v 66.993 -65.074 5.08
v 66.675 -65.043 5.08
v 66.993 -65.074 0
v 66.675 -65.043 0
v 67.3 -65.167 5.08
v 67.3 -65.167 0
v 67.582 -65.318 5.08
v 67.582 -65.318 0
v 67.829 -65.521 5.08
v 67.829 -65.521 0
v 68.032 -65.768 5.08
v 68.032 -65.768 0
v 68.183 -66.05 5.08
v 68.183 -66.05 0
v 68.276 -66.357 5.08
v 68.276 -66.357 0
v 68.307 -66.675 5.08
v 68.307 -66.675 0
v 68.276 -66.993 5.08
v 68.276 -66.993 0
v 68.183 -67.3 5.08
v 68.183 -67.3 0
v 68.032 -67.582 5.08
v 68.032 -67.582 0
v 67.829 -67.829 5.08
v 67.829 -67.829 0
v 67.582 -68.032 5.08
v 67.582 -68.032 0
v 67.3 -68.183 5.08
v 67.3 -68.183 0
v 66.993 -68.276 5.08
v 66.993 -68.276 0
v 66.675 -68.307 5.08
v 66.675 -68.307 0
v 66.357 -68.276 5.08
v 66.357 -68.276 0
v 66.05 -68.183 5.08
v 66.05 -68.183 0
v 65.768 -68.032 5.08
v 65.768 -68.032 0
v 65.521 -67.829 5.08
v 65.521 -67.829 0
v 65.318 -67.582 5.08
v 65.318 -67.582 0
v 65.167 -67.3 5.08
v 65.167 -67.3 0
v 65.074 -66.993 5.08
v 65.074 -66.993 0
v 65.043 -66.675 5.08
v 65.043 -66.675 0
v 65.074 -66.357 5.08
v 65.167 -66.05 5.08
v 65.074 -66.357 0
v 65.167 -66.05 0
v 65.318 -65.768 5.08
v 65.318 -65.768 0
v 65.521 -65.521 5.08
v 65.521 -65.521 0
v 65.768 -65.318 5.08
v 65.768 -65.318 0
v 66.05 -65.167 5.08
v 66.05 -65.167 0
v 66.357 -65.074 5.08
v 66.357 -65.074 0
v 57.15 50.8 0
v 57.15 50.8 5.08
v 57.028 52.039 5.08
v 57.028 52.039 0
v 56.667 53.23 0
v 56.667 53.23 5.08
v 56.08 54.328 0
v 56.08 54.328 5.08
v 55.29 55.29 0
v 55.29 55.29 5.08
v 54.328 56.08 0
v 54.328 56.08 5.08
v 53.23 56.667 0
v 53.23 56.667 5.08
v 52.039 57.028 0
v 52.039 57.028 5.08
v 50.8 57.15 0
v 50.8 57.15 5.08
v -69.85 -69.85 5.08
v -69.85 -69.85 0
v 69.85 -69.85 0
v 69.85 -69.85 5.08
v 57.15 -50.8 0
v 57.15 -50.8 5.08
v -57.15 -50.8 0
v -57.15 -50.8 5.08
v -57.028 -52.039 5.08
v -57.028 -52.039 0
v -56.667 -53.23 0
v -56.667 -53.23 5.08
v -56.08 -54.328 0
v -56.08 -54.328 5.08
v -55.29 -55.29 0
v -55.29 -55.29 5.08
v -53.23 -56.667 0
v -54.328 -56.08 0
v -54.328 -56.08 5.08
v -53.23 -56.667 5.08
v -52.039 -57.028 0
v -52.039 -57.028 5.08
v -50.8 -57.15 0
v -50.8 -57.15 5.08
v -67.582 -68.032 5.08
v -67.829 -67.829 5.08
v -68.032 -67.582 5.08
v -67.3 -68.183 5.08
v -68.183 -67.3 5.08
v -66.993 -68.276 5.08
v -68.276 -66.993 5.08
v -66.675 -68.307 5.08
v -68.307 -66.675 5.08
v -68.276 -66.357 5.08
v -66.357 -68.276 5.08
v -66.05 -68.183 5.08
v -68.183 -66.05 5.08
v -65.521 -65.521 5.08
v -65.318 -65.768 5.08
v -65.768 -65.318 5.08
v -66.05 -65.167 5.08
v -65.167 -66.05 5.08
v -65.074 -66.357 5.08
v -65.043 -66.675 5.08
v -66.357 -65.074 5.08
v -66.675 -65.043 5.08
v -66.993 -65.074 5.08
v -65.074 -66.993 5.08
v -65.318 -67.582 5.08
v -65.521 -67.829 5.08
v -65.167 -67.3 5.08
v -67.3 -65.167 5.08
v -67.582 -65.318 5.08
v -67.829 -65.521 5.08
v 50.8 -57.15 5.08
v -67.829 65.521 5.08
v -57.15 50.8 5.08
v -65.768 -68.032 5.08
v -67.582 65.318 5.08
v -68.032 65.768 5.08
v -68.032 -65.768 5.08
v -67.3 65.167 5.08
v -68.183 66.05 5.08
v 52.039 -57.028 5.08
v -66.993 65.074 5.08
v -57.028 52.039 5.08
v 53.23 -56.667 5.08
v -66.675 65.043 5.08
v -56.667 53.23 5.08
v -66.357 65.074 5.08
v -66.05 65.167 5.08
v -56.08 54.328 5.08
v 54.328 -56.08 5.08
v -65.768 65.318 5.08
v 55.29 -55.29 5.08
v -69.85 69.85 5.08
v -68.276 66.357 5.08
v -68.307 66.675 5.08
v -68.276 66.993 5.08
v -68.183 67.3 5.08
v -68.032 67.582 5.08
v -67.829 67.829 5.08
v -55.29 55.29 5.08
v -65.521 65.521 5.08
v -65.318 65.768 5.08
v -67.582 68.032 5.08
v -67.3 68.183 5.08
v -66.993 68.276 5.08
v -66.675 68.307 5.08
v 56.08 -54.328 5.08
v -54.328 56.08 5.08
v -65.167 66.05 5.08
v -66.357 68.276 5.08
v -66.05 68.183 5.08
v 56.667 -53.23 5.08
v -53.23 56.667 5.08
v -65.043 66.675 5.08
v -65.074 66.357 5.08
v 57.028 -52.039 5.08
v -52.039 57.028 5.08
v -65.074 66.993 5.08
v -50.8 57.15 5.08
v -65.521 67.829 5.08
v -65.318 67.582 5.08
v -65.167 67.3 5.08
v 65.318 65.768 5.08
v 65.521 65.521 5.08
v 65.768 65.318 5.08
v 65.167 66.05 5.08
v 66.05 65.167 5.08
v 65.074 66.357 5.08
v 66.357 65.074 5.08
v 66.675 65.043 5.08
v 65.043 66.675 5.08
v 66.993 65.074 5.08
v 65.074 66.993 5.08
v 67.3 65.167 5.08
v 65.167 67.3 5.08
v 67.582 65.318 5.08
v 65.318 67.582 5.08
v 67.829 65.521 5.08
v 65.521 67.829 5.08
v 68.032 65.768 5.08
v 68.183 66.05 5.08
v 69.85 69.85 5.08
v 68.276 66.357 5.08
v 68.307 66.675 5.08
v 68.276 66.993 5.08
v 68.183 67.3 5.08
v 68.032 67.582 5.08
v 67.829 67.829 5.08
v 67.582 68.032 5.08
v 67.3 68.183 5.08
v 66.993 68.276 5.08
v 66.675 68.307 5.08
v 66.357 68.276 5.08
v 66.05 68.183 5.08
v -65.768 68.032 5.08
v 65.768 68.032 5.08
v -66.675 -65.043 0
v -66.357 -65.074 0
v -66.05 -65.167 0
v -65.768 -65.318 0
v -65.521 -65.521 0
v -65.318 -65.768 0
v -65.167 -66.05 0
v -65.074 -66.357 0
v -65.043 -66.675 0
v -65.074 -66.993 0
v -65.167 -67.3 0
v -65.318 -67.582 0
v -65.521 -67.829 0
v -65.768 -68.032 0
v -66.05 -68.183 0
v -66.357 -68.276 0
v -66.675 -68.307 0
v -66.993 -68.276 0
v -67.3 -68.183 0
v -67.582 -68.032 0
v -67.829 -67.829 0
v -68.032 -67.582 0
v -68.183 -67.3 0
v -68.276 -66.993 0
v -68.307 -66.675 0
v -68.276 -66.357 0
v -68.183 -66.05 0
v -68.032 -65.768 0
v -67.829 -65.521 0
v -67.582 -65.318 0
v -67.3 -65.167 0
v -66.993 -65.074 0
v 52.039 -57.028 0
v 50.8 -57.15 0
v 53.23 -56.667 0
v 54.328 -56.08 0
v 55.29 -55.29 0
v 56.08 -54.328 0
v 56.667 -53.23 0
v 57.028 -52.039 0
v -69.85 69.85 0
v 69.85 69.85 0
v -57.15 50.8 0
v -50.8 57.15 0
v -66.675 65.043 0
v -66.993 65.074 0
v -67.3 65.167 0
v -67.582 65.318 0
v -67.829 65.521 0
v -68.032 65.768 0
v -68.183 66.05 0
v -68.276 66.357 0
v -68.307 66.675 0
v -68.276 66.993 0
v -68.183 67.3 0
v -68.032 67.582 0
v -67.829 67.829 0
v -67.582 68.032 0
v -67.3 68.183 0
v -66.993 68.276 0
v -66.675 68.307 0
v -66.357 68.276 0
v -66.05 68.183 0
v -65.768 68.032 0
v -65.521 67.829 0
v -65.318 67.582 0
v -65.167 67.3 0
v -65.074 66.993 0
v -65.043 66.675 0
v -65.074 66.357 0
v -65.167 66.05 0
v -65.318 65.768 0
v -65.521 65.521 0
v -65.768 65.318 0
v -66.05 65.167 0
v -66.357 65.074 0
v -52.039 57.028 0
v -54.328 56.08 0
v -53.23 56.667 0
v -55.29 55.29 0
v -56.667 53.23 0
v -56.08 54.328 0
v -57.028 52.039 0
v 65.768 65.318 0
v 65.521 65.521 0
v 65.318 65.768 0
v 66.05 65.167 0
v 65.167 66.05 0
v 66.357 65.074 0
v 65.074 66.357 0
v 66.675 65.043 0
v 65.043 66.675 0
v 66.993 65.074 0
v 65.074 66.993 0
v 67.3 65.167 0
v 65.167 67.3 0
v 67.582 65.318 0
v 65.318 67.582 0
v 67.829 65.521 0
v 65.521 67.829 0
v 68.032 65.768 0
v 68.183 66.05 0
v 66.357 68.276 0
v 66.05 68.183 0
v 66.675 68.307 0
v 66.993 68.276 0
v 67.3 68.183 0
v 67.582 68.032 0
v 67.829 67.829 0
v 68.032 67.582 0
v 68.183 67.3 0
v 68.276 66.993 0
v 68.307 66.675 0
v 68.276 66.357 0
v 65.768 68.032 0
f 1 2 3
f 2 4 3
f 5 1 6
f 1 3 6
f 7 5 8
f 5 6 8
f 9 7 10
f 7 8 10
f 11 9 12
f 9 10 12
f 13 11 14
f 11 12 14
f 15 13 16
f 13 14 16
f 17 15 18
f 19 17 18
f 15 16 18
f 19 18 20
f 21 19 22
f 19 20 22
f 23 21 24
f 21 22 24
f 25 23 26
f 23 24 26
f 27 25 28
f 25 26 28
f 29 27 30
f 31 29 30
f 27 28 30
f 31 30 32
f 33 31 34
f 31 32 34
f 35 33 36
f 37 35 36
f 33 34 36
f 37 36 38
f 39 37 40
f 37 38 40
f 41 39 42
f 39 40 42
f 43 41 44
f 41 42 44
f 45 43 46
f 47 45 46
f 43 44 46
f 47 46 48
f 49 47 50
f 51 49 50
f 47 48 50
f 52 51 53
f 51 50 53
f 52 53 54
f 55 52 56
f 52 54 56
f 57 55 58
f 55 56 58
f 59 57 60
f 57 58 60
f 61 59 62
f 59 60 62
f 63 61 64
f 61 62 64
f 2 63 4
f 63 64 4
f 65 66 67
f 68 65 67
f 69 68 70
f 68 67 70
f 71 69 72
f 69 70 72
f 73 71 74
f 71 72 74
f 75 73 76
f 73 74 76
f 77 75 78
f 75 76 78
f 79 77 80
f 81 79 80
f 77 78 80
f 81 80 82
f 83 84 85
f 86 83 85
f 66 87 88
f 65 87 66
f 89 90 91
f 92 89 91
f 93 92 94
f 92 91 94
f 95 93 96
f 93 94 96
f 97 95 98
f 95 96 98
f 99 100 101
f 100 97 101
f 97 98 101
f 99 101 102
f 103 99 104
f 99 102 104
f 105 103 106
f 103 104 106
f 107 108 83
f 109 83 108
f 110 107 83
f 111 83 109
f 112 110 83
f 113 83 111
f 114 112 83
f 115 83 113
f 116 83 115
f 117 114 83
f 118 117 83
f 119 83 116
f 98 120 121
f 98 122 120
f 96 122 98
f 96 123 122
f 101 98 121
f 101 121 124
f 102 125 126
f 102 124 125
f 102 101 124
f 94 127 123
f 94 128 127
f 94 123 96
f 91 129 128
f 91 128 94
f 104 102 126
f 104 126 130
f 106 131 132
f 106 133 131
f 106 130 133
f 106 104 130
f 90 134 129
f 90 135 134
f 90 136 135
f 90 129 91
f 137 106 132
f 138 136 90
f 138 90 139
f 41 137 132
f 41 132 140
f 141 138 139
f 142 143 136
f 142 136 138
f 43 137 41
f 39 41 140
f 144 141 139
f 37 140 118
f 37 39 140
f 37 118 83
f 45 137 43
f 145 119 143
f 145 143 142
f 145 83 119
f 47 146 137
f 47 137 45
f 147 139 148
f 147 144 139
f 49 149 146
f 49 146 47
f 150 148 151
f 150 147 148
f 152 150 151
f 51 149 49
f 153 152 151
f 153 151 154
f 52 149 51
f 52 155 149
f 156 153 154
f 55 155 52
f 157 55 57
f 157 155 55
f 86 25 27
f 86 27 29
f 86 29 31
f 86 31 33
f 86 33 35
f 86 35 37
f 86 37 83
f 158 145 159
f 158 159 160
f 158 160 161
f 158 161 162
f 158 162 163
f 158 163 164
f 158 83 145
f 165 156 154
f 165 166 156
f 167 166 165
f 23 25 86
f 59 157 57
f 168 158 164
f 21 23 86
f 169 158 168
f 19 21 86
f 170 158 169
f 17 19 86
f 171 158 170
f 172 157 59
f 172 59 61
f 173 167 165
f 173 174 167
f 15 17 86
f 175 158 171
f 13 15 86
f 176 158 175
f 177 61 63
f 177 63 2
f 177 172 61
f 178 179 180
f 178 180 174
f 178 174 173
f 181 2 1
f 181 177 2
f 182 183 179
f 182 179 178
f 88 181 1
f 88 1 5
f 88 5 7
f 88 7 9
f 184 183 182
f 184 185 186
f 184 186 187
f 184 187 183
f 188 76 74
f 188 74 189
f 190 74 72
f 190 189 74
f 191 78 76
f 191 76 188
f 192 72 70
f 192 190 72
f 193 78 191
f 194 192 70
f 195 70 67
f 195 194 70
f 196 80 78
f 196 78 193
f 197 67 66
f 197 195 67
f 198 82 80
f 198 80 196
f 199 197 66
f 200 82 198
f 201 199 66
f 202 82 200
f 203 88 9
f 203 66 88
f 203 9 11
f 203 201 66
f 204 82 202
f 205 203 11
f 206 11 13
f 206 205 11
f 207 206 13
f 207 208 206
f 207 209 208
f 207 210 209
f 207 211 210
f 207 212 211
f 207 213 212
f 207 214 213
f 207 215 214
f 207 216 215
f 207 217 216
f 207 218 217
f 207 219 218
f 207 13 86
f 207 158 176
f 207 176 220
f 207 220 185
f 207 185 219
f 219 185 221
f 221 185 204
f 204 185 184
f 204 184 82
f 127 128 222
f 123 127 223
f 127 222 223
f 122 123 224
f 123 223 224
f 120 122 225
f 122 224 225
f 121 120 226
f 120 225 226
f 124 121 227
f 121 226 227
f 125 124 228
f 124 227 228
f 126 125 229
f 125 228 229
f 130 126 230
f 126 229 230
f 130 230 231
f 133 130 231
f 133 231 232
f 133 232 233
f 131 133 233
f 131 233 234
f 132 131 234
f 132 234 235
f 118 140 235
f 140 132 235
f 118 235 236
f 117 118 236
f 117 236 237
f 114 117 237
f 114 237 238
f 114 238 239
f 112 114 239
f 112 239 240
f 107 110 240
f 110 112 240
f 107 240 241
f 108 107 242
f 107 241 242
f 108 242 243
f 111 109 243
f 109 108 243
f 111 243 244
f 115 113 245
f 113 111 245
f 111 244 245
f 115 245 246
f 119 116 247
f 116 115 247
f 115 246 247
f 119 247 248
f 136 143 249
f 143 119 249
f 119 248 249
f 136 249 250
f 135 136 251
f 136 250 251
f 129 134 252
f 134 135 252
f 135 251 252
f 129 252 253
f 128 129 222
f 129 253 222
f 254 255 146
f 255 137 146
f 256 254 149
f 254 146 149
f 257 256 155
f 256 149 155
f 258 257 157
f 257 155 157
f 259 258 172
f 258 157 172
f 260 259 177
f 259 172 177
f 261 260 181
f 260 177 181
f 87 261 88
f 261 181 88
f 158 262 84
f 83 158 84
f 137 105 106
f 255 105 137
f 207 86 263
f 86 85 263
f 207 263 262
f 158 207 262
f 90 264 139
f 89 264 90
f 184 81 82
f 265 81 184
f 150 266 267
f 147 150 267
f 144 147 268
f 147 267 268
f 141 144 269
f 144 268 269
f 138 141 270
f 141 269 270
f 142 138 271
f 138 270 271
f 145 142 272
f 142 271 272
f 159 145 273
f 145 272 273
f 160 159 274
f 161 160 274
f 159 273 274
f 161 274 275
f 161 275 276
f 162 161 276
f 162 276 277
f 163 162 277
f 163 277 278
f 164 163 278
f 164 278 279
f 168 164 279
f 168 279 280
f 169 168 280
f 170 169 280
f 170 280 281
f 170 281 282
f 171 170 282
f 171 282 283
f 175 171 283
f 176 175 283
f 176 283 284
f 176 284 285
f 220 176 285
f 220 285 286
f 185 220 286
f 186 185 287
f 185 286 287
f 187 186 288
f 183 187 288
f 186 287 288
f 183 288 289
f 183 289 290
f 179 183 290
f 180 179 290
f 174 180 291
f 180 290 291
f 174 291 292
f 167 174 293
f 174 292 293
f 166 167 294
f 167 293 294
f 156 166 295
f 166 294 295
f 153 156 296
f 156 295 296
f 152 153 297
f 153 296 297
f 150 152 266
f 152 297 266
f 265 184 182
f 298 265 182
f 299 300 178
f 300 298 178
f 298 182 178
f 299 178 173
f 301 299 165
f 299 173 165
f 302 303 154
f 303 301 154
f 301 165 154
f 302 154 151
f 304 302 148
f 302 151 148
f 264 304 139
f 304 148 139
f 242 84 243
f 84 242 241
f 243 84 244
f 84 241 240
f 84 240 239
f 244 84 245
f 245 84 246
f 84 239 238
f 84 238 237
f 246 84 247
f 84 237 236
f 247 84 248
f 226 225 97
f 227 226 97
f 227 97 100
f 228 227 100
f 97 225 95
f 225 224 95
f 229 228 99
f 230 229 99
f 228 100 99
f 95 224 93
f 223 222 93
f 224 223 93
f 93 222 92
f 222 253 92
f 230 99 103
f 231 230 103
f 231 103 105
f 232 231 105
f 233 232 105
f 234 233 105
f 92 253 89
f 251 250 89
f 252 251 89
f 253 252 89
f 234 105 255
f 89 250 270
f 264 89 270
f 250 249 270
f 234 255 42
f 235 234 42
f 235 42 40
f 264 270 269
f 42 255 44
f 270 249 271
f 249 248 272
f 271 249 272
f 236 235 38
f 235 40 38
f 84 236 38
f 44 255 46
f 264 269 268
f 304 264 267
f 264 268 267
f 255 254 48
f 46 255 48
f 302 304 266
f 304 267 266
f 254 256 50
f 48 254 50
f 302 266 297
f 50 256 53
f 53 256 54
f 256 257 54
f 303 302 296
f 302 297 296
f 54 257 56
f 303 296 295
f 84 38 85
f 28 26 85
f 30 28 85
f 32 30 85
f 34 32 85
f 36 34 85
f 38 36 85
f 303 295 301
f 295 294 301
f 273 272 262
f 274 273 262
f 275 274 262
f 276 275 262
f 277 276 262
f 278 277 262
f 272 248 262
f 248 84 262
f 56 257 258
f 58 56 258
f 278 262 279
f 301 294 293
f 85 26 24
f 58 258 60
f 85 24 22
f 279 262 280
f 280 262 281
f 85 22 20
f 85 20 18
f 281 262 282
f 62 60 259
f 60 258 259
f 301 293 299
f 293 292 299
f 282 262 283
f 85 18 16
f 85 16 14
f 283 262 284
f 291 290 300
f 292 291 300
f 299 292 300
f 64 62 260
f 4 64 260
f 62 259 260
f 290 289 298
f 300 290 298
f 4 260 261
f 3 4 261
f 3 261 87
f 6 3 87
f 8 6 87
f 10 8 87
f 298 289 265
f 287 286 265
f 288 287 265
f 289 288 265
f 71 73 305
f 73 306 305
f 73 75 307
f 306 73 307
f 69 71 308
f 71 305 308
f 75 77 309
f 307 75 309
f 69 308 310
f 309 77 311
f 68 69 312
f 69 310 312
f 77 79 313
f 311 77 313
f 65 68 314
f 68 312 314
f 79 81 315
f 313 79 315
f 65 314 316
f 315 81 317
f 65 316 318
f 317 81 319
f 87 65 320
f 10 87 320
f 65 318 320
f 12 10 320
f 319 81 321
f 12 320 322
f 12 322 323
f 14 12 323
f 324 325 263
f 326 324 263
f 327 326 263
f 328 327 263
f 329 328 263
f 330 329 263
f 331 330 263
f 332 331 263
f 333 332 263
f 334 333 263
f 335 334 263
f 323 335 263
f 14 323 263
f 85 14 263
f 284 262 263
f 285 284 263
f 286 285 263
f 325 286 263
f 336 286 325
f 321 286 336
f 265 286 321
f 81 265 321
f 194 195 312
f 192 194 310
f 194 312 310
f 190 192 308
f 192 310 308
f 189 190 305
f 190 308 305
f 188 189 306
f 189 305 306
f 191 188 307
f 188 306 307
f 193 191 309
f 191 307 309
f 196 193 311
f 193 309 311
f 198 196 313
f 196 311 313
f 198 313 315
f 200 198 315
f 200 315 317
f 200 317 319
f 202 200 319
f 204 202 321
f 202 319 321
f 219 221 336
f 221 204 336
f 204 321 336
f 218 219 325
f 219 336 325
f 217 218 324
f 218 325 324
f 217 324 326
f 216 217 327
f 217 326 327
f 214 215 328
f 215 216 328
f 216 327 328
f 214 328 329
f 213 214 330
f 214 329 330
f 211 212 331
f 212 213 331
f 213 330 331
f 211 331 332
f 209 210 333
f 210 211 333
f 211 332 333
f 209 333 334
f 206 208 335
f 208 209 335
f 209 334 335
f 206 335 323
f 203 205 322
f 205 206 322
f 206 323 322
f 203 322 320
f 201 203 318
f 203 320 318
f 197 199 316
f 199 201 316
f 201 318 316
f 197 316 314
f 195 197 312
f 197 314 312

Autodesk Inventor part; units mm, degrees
ref_plane "YZ Plane" through (0, 0, 0) normal (1, 0, 0) x (0, 1, 0)
ref_plane "XZ Plane" through (0, 0, 0) normal (0, 1, 0) x (-1, 0, 0)
ref_plane "XY Plane" through (0, 0, 0) normal (0, 0, 1) x (1, 0, 0)
sketch "Sketch1" plane through (0, 0, 0) normal (0, 0, 1) x (1, 0, 0)
  line L0 (-63.5, -63.5) -> (63.5, -63.5)
  line L1 (63.5, -63.5) -> (63.5, 63.5)
  line L2 (63.5, 63.5) -> (-63.5, 63.5)
  line L3 (-63.5, 63.5) -> (-63.5, -63.5)
  line L4 (-63.5, -63.5) -> (63.5, 63.5) construction
  line L5 (63.5, -63.5) -> (-63.5, 63.5) construction
  line L6 (-69.85, -69.85) -> (69.85, -69.85)
  line L7 (69.85, -69.85) -> (69.85, 69.85)
  line L8 (69.85, 69.85) -> (-69.85, 69.85)
  line L9 (-69.85, 69.85) -> (-69.85, -69.85)
  line L10 (-57.15, -57.15) -> (57.15, -57.15)
  line L11 (57.15, -57.15) -> (57.15, 57.15)
  line L12 (57.15, 57.15) -> (-57.15, 57.15)
  line L13 (-57.15, 57.15) -> (-57.15, -57.15)
  point P0 (0, 0)
  dimension "d0" = 127
  dimension "d1" = 127
  dimension "d2" = 6.35
  dimension "d3" = 6.35
extrude "Extrusion1" add sketch "Sketch1" along normal blind 5.08 contours L3 L2 L1 L0 | L9 L8 L7 L6
sketch "Sketch2" plane through (0, 0, 5.08) normal (0, 0, 1) x (1, 0, 0)
  line L0 (-57.15, -57.15) -> (-57.15, 57.15) projected
  line L1 (-57.15, 57.15) -> (57.15, 57.15) projected
  line L2 (57.15, 57.15) -> (57.15, -57.15) projected
  line L3 (57.15, -57.15) -> (-57.15, -57.15) projected
  line L4 (-69.85, -69.85) -> (69.85, -69.85) projected
  line L5 (69.85, -69.85) -> (69.85, 69.85) projected
  line L6 (69.85, 69.85) -> (-69.85, 69.85) projected
  line L7 (-69.85, 69.85) -> (-69.85, -69.85) projected
  point P0 (0, 0)
  point P1 (-66.675, 66.675)
  dimension "d6" = 3.175
  dimension "d7" = 3.175
hole "Hole1" at (-66.675, 66.675, 5.08) direction (0, 0, -1) diameter 3.264 end through all clearance for "Flat Head Machine Screw (82)" size "#4" standard "Ansi Unified Screw Threads"
mirror "Mirror1" about plane through (0, 0, 0) normal (0, 1, 0) of "Hole1"
mirror "Mirror2" about plane through (0, 0, 0) normal (1, 0, 0) of "Hole1", "Mirror1"
fillet "Fillet1" radius 6.35 4 edges at (-57.15, 57.15, 2.54) (57.15, 57.15, 2.54) (-57.15, -57.15, 2.54) (57.15, -57.15, 2.54)
properties part number "spacer" material "Aluminum 6061"
